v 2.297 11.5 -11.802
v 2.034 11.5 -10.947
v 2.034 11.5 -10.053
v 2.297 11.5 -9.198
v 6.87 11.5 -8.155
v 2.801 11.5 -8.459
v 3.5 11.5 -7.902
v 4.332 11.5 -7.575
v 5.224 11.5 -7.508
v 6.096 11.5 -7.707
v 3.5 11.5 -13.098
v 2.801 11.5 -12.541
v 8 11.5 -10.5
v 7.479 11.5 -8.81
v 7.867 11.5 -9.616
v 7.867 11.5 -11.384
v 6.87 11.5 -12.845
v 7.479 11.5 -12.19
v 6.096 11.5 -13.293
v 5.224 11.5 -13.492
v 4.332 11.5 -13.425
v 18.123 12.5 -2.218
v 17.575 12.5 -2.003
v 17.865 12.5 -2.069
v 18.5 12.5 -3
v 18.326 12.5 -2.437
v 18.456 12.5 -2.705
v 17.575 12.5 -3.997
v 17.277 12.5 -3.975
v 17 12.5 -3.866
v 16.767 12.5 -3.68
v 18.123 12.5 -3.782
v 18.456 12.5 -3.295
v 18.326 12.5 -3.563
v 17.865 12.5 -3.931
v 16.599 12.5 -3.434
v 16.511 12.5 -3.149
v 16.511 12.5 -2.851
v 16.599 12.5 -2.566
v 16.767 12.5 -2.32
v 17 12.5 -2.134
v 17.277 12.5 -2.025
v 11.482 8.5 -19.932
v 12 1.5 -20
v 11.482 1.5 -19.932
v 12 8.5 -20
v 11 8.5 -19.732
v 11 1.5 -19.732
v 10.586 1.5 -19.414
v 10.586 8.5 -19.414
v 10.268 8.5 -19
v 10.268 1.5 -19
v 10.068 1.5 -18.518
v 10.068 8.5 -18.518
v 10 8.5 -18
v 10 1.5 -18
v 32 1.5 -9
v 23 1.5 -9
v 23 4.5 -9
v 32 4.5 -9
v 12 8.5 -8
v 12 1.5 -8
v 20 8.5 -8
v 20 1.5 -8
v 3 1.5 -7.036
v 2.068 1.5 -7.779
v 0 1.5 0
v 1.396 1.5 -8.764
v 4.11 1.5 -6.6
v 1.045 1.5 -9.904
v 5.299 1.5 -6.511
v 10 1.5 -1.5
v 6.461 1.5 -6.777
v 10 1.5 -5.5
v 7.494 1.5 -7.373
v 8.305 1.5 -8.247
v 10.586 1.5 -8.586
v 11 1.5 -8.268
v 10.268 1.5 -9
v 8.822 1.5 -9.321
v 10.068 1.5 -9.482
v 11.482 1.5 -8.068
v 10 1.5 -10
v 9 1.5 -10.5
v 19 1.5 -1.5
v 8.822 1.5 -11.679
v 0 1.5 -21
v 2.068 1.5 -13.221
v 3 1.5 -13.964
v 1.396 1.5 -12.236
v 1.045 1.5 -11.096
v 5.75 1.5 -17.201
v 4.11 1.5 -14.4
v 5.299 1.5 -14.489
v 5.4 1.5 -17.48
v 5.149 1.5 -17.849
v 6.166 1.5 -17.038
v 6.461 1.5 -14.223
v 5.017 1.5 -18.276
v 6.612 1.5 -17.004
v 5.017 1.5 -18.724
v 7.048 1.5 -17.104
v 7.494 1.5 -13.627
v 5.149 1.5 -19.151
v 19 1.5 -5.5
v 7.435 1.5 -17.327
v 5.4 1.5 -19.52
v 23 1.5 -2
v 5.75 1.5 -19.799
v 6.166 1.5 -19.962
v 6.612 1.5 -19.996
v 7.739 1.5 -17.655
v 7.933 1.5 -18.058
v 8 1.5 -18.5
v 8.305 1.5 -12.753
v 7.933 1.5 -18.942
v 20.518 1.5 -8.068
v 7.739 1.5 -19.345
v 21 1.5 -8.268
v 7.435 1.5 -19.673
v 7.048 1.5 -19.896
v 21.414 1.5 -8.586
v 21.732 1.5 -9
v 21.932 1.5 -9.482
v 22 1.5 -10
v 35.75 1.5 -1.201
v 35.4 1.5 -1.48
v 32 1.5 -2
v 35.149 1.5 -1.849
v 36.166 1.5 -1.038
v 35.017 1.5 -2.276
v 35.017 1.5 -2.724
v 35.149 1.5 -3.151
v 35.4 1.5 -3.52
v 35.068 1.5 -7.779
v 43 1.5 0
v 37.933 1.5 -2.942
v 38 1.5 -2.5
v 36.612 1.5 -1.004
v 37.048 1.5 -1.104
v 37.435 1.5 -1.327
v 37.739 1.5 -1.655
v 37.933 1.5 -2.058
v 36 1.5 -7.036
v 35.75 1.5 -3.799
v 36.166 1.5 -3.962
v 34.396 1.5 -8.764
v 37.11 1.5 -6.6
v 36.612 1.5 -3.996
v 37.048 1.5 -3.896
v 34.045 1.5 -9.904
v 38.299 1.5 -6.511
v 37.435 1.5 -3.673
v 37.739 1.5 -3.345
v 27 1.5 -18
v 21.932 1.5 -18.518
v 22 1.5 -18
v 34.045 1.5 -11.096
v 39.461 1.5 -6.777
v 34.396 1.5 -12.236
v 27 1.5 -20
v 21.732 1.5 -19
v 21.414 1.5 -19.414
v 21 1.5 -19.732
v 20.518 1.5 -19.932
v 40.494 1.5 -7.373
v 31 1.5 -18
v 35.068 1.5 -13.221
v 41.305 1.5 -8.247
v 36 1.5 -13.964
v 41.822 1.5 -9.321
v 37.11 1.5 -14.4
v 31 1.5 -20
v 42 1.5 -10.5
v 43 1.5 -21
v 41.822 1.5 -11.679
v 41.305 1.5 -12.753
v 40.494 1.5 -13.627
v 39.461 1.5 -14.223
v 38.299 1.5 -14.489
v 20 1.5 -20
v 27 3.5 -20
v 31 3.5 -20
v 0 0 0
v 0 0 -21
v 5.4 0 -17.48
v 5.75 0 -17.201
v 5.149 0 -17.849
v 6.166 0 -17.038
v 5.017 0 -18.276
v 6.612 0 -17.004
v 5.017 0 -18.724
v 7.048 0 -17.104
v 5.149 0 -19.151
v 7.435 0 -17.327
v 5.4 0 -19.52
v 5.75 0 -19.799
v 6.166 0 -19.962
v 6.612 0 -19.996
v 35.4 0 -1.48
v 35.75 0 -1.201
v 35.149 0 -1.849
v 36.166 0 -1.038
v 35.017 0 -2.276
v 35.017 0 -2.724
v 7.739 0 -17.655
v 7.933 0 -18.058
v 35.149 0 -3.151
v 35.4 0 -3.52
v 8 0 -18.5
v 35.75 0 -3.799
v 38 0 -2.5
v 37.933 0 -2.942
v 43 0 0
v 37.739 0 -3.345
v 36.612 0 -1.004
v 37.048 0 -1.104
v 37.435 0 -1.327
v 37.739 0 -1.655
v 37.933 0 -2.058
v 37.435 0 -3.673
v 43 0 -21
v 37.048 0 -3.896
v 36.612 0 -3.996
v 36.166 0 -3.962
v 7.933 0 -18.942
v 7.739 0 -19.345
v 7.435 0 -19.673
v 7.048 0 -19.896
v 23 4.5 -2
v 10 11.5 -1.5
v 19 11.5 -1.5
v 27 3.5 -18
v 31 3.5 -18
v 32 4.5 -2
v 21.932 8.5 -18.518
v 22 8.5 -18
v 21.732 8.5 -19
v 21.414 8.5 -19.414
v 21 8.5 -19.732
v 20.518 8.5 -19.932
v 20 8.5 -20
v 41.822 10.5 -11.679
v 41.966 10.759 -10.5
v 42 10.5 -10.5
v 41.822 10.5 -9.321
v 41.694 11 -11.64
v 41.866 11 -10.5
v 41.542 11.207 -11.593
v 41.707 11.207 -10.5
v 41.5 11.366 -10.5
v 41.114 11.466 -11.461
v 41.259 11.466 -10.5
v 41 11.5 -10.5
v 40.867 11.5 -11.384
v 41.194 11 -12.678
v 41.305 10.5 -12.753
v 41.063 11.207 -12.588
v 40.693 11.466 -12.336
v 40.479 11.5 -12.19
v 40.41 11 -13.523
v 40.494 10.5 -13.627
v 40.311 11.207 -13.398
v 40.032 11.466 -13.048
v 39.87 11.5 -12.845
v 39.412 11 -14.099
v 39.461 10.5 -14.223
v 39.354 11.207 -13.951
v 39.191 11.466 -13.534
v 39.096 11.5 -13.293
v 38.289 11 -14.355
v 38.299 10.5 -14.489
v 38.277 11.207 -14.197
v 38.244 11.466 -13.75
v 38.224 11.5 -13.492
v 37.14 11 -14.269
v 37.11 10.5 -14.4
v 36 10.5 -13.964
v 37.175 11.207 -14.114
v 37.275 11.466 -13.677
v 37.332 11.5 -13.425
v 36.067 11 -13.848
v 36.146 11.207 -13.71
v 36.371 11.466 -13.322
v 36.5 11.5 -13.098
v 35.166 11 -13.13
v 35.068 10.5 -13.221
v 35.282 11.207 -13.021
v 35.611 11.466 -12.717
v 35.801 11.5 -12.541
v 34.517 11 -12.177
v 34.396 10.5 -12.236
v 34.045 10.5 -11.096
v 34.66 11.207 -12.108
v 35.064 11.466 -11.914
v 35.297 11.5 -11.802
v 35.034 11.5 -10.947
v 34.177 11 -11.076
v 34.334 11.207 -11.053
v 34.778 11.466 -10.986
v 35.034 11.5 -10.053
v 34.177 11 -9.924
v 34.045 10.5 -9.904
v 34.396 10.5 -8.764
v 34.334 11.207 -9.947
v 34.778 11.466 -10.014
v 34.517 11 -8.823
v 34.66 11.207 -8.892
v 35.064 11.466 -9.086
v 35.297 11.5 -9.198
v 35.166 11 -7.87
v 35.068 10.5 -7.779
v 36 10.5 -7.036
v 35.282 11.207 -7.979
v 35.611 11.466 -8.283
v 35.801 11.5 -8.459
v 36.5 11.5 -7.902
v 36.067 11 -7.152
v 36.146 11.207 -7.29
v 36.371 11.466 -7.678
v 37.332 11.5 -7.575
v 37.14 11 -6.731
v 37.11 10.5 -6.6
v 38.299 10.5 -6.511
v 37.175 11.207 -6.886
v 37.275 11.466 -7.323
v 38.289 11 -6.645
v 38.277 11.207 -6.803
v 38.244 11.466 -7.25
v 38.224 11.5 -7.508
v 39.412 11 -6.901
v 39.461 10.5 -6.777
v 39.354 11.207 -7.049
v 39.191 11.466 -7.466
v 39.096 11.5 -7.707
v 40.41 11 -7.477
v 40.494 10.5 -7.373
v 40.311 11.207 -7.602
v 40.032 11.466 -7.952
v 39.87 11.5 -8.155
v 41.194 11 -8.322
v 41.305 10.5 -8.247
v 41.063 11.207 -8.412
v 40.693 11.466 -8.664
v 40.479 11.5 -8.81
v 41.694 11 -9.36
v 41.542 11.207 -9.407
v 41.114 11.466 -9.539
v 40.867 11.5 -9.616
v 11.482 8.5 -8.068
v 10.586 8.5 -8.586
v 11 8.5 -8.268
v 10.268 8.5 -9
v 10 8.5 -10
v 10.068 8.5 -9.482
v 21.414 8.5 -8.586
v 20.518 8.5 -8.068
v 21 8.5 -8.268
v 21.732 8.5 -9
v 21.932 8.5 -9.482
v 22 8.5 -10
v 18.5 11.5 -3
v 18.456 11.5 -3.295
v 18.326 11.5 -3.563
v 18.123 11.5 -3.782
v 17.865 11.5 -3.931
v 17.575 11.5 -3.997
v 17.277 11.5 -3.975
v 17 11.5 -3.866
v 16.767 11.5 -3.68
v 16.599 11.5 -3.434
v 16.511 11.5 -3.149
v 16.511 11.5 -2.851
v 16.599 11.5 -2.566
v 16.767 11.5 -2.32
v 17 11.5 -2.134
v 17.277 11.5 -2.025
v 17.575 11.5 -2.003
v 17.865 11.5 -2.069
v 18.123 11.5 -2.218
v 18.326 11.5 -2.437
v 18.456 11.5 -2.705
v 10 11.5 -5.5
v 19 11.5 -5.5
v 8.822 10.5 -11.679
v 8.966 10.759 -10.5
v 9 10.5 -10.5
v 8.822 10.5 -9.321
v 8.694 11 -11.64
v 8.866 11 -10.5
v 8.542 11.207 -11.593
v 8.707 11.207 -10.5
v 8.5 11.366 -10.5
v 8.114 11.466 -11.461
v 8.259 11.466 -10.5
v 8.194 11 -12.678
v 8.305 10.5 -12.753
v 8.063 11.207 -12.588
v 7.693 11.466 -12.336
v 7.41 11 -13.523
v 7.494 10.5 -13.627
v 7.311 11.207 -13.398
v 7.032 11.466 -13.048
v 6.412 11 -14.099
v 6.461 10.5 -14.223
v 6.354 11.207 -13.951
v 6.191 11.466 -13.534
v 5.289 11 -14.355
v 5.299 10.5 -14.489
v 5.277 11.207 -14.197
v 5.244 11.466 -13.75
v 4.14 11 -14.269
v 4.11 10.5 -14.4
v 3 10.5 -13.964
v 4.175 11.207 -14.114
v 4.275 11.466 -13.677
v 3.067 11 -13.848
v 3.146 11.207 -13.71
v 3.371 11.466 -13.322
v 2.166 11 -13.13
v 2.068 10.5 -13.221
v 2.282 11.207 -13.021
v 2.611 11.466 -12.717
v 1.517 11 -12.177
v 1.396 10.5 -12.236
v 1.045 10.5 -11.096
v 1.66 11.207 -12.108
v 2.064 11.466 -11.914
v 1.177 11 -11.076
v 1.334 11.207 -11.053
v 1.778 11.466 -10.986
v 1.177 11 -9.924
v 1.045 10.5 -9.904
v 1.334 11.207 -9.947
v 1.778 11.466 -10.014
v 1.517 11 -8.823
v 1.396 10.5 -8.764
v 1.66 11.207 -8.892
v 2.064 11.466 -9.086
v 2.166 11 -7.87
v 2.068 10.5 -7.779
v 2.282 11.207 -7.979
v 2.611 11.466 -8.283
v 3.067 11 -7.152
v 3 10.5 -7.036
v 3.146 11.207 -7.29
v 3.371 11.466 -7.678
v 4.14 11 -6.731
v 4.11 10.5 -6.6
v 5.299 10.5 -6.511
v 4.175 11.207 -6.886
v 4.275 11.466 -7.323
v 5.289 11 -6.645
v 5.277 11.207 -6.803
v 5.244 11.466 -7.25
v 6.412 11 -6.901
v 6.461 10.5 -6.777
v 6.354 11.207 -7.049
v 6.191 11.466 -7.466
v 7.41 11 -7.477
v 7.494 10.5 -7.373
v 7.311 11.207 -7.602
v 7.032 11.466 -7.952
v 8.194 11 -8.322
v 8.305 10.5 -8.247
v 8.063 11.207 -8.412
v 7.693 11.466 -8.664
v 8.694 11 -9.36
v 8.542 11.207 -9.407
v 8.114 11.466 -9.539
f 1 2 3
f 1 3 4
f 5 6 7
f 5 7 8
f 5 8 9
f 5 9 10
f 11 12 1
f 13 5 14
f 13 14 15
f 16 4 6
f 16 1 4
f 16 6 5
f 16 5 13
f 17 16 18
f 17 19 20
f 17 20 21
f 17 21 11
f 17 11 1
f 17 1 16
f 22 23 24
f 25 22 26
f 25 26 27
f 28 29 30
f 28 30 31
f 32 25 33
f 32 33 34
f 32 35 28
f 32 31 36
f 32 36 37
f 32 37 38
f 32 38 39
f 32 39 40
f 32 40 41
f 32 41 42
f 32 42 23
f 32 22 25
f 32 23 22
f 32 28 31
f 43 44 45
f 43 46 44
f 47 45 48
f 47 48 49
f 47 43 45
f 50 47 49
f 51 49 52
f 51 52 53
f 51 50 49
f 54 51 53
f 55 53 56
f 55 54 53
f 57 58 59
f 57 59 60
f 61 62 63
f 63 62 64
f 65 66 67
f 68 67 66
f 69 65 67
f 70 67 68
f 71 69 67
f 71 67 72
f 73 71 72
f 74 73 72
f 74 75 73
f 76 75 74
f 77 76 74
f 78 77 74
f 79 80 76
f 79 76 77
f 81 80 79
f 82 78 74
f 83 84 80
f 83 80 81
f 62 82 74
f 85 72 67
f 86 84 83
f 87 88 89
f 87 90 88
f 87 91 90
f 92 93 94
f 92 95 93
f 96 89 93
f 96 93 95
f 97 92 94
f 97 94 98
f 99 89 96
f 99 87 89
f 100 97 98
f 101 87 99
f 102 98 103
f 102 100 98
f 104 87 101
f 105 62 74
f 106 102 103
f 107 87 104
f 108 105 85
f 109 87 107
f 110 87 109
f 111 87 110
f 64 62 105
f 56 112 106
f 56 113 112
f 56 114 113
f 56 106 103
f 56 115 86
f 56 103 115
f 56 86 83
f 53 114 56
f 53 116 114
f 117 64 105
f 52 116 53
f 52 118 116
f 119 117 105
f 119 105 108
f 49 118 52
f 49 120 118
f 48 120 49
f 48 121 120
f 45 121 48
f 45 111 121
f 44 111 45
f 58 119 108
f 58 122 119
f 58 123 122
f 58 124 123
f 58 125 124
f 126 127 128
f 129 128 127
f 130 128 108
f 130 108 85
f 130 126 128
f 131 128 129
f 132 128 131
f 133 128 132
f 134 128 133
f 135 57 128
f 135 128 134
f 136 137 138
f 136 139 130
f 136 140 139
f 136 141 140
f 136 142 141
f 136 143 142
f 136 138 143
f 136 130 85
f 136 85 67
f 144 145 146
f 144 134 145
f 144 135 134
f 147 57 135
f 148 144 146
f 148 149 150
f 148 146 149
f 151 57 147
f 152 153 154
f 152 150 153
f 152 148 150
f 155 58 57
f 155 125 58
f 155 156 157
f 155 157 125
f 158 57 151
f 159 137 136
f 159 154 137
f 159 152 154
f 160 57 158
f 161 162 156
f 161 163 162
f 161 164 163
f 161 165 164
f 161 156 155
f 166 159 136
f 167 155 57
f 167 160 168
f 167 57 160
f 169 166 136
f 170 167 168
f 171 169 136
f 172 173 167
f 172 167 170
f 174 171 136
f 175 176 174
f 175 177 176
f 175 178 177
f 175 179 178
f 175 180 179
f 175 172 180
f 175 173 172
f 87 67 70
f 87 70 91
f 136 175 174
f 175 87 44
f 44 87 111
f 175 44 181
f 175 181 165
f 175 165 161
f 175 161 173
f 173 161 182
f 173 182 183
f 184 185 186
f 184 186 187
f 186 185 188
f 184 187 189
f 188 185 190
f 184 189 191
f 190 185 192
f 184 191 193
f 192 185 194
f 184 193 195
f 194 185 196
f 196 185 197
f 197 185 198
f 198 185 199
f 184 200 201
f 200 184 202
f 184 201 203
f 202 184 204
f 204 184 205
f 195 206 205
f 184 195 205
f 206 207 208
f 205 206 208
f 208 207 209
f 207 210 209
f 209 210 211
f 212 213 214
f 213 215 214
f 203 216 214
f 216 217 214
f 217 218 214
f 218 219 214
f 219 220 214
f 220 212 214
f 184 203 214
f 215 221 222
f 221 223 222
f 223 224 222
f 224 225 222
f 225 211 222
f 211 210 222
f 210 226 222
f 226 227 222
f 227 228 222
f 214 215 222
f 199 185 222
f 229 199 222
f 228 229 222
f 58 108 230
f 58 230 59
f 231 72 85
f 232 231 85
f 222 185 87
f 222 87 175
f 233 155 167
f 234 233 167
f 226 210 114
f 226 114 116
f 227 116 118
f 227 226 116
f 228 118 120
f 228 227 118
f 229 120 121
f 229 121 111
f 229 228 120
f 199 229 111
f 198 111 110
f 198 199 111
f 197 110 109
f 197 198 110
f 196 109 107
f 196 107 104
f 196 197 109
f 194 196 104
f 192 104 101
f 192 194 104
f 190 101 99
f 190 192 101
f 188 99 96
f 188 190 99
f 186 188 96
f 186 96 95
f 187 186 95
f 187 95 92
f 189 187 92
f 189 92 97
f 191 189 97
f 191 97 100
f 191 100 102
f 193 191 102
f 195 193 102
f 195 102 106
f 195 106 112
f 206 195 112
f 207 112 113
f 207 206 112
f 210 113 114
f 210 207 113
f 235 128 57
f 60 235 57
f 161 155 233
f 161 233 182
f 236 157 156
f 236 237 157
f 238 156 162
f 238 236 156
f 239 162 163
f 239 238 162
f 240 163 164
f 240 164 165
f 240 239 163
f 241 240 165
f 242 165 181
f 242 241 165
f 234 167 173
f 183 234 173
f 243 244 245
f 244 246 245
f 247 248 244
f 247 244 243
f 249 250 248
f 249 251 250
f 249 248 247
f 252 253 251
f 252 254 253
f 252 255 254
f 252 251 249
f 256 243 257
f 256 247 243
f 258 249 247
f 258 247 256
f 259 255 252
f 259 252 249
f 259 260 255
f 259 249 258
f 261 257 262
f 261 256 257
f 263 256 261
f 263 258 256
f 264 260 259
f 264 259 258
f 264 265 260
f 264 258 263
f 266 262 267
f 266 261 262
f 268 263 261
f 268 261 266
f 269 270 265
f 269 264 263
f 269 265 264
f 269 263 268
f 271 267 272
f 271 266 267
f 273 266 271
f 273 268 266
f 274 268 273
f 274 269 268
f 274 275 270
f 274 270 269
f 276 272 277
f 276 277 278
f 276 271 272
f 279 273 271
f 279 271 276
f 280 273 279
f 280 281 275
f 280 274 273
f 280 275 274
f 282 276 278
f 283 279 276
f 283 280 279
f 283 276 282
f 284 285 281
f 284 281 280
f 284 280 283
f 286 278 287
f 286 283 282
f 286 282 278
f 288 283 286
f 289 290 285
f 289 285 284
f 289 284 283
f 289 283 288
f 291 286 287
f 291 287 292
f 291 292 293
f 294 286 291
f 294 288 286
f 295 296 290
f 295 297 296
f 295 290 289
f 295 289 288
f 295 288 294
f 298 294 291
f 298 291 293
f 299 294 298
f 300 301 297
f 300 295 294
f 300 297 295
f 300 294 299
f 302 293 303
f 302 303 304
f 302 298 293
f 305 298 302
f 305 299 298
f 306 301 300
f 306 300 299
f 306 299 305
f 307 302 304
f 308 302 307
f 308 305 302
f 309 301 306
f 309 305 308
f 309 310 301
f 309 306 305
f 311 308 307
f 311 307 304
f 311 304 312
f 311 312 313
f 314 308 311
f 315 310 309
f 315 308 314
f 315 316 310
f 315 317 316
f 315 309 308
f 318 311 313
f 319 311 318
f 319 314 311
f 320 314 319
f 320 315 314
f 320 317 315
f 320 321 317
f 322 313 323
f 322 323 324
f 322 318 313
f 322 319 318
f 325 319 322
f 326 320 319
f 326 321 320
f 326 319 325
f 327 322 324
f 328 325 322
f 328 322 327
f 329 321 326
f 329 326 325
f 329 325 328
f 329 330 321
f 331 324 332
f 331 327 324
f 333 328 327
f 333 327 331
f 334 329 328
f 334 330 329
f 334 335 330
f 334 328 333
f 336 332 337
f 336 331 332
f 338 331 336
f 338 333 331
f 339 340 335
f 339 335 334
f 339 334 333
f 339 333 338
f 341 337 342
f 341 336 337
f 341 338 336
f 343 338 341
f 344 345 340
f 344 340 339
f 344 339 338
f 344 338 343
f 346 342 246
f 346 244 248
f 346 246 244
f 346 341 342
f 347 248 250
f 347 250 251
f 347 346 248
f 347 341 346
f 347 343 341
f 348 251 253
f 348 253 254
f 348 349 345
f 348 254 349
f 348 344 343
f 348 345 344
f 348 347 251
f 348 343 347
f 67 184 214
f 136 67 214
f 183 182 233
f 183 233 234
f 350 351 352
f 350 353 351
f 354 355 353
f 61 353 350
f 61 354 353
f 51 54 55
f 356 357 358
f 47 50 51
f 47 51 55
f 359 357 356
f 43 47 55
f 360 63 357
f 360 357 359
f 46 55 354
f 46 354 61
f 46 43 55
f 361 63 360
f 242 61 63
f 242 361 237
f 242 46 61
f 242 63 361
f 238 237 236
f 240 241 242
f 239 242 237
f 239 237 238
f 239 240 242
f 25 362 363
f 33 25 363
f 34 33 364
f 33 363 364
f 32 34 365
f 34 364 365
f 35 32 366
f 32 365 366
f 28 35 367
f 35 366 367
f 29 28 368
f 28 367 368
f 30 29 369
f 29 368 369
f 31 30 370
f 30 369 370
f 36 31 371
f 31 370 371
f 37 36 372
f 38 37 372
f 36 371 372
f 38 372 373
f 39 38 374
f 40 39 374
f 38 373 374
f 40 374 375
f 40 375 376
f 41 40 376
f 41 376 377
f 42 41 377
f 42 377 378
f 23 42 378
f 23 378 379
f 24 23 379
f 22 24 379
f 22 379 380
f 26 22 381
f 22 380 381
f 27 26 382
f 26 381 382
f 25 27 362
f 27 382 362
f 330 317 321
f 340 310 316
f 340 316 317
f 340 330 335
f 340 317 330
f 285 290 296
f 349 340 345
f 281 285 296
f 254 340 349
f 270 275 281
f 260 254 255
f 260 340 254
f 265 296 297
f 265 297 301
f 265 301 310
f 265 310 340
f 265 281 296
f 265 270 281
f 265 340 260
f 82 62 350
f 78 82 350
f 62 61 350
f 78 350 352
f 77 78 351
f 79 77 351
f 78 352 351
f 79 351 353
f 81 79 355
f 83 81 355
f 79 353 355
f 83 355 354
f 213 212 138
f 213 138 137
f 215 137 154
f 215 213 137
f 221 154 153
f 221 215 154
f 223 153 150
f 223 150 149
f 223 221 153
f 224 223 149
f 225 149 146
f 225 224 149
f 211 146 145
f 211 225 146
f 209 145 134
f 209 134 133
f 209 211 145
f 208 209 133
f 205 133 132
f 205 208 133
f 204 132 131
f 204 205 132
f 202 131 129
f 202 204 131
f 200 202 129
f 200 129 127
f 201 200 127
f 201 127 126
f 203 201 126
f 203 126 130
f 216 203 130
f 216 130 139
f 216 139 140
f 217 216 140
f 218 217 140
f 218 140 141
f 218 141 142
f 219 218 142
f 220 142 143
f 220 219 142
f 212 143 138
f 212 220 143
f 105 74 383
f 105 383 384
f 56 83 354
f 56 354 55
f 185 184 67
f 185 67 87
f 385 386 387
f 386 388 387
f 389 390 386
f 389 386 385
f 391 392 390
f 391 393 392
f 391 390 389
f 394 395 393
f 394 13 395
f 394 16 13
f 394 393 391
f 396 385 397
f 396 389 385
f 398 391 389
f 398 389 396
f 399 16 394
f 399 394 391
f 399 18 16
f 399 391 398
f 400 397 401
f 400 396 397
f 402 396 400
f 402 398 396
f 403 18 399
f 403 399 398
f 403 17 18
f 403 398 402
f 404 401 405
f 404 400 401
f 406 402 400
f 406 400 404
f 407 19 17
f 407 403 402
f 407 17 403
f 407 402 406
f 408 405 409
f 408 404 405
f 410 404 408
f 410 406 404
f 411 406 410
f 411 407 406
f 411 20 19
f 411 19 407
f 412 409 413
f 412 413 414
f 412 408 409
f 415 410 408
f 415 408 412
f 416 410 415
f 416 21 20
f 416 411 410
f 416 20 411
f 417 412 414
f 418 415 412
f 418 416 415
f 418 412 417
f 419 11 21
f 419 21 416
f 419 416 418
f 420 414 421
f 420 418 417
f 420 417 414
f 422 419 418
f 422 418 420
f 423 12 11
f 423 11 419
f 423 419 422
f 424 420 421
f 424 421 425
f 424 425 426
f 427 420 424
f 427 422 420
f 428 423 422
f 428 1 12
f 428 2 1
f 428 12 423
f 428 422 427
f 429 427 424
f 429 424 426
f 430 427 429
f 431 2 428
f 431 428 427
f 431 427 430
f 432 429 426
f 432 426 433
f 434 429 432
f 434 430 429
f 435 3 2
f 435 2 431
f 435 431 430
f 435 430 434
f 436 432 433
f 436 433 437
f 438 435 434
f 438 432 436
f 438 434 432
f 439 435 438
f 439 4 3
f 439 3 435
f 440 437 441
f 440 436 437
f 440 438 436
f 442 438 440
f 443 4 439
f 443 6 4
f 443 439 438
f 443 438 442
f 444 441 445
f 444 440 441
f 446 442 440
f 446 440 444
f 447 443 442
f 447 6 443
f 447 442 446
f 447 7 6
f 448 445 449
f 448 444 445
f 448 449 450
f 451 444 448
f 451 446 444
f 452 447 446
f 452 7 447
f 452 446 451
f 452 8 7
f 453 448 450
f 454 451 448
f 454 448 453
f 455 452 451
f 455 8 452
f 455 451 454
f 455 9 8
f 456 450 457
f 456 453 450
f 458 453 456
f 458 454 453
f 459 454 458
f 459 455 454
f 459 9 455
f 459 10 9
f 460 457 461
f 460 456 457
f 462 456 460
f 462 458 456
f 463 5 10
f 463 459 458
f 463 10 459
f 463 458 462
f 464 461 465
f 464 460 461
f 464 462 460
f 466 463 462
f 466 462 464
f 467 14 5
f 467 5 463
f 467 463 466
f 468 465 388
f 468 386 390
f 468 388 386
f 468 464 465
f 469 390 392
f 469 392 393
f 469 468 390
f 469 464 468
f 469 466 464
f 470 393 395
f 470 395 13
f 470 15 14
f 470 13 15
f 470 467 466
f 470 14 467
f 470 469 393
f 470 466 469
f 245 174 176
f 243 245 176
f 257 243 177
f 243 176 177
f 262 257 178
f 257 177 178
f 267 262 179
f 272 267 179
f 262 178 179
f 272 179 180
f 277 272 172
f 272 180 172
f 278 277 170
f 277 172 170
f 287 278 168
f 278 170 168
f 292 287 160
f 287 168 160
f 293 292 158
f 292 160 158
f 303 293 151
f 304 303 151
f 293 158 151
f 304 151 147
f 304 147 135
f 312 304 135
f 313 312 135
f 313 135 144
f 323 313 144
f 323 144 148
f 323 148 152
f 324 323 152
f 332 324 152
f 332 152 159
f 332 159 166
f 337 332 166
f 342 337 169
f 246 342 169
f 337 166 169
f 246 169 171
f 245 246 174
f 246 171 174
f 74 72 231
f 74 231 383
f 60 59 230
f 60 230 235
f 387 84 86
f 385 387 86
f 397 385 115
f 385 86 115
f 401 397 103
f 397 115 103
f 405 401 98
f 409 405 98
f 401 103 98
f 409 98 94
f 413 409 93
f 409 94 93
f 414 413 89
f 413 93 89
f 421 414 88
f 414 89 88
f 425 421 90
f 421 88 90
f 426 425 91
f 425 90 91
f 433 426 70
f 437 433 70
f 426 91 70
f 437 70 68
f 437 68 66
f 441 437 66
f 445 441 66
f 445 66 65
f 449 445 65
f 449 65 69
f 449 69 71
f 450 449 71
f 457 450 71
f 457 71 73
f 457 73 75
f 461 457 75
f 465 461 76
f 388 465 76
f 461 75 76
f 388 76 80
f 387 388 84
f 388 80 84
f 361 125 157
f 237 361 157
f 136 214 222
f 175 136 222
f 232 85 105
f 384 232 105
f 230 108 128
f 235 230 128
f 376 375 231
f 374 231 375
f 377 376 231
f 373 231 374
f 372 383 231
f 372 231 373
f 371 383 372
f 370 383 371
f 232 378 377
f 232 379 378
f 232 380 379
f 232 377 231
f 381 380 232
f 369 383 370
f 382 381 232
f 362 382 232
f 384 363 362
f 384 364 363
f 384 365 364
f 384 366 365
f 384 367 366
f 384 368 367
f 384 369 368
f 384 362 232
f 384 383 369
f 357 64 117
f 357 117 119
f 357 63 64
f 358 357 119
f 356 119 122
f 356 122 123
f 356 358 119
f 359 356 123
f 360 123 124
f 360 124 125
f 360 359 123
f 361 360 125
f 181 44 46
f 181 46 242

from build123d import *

# Parameters (mm, degrees)
SKETCH_W             = 43
SKETCH_H             = 21
SKETCH_R             = 1.5
PAD_DEPTH            = 1.5
SKETCH001_R          = 4
PAD001_DEPTH         = 10
FILLET_R             = 1
SKETCH002_W          = 12
SKETCH002_H          = 12
PAD002_DEPTH         = 7
FILLET001_R          = 2
SKETCH003_W          = 9
SKETCH003_H          = 4
PAD003_DEPTH         = 10
SKETCH004_R          = 1
PAD004_DEPTH         = 1
SKETCH005_W          = 9
SKETCH005_H          = 7
PAD005_DEPTH         = 3
SKETCH006_W          = 4
SKETCH006_H          = 2
PAD006_DEPTH         = 2
BODY_PLACEMENT_ANGLE = 180


with BuildPart() as part:
    # Sketch → Pad (new body)
    with BuildSketch(Plane.XZ):
        with Locations((21.5, 10.5)):
            Rectangle(SKETCH_W, SKETCH_H)
        with Locations((6.5, 18.5)):
            Circle(SKETCH_R, mode=Mode.SUBTRACT)
        with Locations((36.5, 2.5)):
            Circle(SKETCH_R, mode=Mode.SUBTRACT)
    extrude(amount=PAD_DEPTH)

    # Sketch001 (on Face8 of Pad) → Pad001 (join)
    with BuildSketch(Plane.XZ.offset(1.5)):
        with Locations((5, 10.5)):
            Circle(SKETCH001_R)
        with Locations((38, 10.5)):
            Circle(SKETCH001_R)
    extrude(amount=PAD001_DEPTH)

    # Fillet
    fillet_edges = [part.edges().sort_by_distance(p)[0] for p in [
        (1, -11.5, 10.5),
        (34, -11.5, 10.5),
    ]]
    fillet(fillet_edges, radius=FILLET_R)

    # Sketch002 (on Face3 of Fillet) → Pad002 (join)
    with BuildSketch(Plane.XZ.offset(1.5)):
        with Locations((16, 14)):
            Rectangle(SKETCH002_W, SKETCH002_H)
    extrude(amount=PAD002_DEPTH)

    # Fillet001
    fillet001_edges = [part.edges().sort_by_distance(p)[0] for p in [
        (22, -5, 20),
        (22, -5, 8),
        (10, -5, 20),
        (10, -5, 8),
    ]]
    fillet(fillet001_edges, radius=FILLET001_R)

    # Sketch003 (on Face1 of Fillet001) → Pad003 (join)
    with BuildSketch(Plane.XZ.offset(1.5)):
        with Locations((14.5, 3.5)):
            Rectangle(SKETCH003_W, SKETCH003_H)
    extrude(amount=PAD003_DEPTH)

    # Sketch004 (on Face25 of Pad003) → Pad004 (join)
    with BuildSketch(Plane.XZ.offset(11.5)):
        with Locations((17.5, 3)):
            Circle(SKETCH004_R)
    extrude(amount=PAD004_DEPTH)

    # Sketch005 (on Face1 of Pad004) → Pad005 (join)
    with BuildSketch(Plane.XZ.offset(1.5)):
        with Locations((27.5, 5.5)):
            Rectangle(SKETCH005_W, SKETCH005_H)
    extrude(amount=PAD005_DEPTH)

    # Sketch006 (on Face1 of Pad005) → Pad006 (join)
    with BuildSketch(Plane.XZ.offset(1.5)):
        with Locations((29, 19)):
            Rectangle(SKETCH006_W, SKETCH006_H)
    extrude(amount=PAD006_DEPTH)


with BuildPart() as part_1:
    # Body placement: moved
    add(part.part.rotate(Axis((0, 0, 0), (1, 0, 0)), BODY_PLACEMENT_ANGLE))


solid = part_1.part
